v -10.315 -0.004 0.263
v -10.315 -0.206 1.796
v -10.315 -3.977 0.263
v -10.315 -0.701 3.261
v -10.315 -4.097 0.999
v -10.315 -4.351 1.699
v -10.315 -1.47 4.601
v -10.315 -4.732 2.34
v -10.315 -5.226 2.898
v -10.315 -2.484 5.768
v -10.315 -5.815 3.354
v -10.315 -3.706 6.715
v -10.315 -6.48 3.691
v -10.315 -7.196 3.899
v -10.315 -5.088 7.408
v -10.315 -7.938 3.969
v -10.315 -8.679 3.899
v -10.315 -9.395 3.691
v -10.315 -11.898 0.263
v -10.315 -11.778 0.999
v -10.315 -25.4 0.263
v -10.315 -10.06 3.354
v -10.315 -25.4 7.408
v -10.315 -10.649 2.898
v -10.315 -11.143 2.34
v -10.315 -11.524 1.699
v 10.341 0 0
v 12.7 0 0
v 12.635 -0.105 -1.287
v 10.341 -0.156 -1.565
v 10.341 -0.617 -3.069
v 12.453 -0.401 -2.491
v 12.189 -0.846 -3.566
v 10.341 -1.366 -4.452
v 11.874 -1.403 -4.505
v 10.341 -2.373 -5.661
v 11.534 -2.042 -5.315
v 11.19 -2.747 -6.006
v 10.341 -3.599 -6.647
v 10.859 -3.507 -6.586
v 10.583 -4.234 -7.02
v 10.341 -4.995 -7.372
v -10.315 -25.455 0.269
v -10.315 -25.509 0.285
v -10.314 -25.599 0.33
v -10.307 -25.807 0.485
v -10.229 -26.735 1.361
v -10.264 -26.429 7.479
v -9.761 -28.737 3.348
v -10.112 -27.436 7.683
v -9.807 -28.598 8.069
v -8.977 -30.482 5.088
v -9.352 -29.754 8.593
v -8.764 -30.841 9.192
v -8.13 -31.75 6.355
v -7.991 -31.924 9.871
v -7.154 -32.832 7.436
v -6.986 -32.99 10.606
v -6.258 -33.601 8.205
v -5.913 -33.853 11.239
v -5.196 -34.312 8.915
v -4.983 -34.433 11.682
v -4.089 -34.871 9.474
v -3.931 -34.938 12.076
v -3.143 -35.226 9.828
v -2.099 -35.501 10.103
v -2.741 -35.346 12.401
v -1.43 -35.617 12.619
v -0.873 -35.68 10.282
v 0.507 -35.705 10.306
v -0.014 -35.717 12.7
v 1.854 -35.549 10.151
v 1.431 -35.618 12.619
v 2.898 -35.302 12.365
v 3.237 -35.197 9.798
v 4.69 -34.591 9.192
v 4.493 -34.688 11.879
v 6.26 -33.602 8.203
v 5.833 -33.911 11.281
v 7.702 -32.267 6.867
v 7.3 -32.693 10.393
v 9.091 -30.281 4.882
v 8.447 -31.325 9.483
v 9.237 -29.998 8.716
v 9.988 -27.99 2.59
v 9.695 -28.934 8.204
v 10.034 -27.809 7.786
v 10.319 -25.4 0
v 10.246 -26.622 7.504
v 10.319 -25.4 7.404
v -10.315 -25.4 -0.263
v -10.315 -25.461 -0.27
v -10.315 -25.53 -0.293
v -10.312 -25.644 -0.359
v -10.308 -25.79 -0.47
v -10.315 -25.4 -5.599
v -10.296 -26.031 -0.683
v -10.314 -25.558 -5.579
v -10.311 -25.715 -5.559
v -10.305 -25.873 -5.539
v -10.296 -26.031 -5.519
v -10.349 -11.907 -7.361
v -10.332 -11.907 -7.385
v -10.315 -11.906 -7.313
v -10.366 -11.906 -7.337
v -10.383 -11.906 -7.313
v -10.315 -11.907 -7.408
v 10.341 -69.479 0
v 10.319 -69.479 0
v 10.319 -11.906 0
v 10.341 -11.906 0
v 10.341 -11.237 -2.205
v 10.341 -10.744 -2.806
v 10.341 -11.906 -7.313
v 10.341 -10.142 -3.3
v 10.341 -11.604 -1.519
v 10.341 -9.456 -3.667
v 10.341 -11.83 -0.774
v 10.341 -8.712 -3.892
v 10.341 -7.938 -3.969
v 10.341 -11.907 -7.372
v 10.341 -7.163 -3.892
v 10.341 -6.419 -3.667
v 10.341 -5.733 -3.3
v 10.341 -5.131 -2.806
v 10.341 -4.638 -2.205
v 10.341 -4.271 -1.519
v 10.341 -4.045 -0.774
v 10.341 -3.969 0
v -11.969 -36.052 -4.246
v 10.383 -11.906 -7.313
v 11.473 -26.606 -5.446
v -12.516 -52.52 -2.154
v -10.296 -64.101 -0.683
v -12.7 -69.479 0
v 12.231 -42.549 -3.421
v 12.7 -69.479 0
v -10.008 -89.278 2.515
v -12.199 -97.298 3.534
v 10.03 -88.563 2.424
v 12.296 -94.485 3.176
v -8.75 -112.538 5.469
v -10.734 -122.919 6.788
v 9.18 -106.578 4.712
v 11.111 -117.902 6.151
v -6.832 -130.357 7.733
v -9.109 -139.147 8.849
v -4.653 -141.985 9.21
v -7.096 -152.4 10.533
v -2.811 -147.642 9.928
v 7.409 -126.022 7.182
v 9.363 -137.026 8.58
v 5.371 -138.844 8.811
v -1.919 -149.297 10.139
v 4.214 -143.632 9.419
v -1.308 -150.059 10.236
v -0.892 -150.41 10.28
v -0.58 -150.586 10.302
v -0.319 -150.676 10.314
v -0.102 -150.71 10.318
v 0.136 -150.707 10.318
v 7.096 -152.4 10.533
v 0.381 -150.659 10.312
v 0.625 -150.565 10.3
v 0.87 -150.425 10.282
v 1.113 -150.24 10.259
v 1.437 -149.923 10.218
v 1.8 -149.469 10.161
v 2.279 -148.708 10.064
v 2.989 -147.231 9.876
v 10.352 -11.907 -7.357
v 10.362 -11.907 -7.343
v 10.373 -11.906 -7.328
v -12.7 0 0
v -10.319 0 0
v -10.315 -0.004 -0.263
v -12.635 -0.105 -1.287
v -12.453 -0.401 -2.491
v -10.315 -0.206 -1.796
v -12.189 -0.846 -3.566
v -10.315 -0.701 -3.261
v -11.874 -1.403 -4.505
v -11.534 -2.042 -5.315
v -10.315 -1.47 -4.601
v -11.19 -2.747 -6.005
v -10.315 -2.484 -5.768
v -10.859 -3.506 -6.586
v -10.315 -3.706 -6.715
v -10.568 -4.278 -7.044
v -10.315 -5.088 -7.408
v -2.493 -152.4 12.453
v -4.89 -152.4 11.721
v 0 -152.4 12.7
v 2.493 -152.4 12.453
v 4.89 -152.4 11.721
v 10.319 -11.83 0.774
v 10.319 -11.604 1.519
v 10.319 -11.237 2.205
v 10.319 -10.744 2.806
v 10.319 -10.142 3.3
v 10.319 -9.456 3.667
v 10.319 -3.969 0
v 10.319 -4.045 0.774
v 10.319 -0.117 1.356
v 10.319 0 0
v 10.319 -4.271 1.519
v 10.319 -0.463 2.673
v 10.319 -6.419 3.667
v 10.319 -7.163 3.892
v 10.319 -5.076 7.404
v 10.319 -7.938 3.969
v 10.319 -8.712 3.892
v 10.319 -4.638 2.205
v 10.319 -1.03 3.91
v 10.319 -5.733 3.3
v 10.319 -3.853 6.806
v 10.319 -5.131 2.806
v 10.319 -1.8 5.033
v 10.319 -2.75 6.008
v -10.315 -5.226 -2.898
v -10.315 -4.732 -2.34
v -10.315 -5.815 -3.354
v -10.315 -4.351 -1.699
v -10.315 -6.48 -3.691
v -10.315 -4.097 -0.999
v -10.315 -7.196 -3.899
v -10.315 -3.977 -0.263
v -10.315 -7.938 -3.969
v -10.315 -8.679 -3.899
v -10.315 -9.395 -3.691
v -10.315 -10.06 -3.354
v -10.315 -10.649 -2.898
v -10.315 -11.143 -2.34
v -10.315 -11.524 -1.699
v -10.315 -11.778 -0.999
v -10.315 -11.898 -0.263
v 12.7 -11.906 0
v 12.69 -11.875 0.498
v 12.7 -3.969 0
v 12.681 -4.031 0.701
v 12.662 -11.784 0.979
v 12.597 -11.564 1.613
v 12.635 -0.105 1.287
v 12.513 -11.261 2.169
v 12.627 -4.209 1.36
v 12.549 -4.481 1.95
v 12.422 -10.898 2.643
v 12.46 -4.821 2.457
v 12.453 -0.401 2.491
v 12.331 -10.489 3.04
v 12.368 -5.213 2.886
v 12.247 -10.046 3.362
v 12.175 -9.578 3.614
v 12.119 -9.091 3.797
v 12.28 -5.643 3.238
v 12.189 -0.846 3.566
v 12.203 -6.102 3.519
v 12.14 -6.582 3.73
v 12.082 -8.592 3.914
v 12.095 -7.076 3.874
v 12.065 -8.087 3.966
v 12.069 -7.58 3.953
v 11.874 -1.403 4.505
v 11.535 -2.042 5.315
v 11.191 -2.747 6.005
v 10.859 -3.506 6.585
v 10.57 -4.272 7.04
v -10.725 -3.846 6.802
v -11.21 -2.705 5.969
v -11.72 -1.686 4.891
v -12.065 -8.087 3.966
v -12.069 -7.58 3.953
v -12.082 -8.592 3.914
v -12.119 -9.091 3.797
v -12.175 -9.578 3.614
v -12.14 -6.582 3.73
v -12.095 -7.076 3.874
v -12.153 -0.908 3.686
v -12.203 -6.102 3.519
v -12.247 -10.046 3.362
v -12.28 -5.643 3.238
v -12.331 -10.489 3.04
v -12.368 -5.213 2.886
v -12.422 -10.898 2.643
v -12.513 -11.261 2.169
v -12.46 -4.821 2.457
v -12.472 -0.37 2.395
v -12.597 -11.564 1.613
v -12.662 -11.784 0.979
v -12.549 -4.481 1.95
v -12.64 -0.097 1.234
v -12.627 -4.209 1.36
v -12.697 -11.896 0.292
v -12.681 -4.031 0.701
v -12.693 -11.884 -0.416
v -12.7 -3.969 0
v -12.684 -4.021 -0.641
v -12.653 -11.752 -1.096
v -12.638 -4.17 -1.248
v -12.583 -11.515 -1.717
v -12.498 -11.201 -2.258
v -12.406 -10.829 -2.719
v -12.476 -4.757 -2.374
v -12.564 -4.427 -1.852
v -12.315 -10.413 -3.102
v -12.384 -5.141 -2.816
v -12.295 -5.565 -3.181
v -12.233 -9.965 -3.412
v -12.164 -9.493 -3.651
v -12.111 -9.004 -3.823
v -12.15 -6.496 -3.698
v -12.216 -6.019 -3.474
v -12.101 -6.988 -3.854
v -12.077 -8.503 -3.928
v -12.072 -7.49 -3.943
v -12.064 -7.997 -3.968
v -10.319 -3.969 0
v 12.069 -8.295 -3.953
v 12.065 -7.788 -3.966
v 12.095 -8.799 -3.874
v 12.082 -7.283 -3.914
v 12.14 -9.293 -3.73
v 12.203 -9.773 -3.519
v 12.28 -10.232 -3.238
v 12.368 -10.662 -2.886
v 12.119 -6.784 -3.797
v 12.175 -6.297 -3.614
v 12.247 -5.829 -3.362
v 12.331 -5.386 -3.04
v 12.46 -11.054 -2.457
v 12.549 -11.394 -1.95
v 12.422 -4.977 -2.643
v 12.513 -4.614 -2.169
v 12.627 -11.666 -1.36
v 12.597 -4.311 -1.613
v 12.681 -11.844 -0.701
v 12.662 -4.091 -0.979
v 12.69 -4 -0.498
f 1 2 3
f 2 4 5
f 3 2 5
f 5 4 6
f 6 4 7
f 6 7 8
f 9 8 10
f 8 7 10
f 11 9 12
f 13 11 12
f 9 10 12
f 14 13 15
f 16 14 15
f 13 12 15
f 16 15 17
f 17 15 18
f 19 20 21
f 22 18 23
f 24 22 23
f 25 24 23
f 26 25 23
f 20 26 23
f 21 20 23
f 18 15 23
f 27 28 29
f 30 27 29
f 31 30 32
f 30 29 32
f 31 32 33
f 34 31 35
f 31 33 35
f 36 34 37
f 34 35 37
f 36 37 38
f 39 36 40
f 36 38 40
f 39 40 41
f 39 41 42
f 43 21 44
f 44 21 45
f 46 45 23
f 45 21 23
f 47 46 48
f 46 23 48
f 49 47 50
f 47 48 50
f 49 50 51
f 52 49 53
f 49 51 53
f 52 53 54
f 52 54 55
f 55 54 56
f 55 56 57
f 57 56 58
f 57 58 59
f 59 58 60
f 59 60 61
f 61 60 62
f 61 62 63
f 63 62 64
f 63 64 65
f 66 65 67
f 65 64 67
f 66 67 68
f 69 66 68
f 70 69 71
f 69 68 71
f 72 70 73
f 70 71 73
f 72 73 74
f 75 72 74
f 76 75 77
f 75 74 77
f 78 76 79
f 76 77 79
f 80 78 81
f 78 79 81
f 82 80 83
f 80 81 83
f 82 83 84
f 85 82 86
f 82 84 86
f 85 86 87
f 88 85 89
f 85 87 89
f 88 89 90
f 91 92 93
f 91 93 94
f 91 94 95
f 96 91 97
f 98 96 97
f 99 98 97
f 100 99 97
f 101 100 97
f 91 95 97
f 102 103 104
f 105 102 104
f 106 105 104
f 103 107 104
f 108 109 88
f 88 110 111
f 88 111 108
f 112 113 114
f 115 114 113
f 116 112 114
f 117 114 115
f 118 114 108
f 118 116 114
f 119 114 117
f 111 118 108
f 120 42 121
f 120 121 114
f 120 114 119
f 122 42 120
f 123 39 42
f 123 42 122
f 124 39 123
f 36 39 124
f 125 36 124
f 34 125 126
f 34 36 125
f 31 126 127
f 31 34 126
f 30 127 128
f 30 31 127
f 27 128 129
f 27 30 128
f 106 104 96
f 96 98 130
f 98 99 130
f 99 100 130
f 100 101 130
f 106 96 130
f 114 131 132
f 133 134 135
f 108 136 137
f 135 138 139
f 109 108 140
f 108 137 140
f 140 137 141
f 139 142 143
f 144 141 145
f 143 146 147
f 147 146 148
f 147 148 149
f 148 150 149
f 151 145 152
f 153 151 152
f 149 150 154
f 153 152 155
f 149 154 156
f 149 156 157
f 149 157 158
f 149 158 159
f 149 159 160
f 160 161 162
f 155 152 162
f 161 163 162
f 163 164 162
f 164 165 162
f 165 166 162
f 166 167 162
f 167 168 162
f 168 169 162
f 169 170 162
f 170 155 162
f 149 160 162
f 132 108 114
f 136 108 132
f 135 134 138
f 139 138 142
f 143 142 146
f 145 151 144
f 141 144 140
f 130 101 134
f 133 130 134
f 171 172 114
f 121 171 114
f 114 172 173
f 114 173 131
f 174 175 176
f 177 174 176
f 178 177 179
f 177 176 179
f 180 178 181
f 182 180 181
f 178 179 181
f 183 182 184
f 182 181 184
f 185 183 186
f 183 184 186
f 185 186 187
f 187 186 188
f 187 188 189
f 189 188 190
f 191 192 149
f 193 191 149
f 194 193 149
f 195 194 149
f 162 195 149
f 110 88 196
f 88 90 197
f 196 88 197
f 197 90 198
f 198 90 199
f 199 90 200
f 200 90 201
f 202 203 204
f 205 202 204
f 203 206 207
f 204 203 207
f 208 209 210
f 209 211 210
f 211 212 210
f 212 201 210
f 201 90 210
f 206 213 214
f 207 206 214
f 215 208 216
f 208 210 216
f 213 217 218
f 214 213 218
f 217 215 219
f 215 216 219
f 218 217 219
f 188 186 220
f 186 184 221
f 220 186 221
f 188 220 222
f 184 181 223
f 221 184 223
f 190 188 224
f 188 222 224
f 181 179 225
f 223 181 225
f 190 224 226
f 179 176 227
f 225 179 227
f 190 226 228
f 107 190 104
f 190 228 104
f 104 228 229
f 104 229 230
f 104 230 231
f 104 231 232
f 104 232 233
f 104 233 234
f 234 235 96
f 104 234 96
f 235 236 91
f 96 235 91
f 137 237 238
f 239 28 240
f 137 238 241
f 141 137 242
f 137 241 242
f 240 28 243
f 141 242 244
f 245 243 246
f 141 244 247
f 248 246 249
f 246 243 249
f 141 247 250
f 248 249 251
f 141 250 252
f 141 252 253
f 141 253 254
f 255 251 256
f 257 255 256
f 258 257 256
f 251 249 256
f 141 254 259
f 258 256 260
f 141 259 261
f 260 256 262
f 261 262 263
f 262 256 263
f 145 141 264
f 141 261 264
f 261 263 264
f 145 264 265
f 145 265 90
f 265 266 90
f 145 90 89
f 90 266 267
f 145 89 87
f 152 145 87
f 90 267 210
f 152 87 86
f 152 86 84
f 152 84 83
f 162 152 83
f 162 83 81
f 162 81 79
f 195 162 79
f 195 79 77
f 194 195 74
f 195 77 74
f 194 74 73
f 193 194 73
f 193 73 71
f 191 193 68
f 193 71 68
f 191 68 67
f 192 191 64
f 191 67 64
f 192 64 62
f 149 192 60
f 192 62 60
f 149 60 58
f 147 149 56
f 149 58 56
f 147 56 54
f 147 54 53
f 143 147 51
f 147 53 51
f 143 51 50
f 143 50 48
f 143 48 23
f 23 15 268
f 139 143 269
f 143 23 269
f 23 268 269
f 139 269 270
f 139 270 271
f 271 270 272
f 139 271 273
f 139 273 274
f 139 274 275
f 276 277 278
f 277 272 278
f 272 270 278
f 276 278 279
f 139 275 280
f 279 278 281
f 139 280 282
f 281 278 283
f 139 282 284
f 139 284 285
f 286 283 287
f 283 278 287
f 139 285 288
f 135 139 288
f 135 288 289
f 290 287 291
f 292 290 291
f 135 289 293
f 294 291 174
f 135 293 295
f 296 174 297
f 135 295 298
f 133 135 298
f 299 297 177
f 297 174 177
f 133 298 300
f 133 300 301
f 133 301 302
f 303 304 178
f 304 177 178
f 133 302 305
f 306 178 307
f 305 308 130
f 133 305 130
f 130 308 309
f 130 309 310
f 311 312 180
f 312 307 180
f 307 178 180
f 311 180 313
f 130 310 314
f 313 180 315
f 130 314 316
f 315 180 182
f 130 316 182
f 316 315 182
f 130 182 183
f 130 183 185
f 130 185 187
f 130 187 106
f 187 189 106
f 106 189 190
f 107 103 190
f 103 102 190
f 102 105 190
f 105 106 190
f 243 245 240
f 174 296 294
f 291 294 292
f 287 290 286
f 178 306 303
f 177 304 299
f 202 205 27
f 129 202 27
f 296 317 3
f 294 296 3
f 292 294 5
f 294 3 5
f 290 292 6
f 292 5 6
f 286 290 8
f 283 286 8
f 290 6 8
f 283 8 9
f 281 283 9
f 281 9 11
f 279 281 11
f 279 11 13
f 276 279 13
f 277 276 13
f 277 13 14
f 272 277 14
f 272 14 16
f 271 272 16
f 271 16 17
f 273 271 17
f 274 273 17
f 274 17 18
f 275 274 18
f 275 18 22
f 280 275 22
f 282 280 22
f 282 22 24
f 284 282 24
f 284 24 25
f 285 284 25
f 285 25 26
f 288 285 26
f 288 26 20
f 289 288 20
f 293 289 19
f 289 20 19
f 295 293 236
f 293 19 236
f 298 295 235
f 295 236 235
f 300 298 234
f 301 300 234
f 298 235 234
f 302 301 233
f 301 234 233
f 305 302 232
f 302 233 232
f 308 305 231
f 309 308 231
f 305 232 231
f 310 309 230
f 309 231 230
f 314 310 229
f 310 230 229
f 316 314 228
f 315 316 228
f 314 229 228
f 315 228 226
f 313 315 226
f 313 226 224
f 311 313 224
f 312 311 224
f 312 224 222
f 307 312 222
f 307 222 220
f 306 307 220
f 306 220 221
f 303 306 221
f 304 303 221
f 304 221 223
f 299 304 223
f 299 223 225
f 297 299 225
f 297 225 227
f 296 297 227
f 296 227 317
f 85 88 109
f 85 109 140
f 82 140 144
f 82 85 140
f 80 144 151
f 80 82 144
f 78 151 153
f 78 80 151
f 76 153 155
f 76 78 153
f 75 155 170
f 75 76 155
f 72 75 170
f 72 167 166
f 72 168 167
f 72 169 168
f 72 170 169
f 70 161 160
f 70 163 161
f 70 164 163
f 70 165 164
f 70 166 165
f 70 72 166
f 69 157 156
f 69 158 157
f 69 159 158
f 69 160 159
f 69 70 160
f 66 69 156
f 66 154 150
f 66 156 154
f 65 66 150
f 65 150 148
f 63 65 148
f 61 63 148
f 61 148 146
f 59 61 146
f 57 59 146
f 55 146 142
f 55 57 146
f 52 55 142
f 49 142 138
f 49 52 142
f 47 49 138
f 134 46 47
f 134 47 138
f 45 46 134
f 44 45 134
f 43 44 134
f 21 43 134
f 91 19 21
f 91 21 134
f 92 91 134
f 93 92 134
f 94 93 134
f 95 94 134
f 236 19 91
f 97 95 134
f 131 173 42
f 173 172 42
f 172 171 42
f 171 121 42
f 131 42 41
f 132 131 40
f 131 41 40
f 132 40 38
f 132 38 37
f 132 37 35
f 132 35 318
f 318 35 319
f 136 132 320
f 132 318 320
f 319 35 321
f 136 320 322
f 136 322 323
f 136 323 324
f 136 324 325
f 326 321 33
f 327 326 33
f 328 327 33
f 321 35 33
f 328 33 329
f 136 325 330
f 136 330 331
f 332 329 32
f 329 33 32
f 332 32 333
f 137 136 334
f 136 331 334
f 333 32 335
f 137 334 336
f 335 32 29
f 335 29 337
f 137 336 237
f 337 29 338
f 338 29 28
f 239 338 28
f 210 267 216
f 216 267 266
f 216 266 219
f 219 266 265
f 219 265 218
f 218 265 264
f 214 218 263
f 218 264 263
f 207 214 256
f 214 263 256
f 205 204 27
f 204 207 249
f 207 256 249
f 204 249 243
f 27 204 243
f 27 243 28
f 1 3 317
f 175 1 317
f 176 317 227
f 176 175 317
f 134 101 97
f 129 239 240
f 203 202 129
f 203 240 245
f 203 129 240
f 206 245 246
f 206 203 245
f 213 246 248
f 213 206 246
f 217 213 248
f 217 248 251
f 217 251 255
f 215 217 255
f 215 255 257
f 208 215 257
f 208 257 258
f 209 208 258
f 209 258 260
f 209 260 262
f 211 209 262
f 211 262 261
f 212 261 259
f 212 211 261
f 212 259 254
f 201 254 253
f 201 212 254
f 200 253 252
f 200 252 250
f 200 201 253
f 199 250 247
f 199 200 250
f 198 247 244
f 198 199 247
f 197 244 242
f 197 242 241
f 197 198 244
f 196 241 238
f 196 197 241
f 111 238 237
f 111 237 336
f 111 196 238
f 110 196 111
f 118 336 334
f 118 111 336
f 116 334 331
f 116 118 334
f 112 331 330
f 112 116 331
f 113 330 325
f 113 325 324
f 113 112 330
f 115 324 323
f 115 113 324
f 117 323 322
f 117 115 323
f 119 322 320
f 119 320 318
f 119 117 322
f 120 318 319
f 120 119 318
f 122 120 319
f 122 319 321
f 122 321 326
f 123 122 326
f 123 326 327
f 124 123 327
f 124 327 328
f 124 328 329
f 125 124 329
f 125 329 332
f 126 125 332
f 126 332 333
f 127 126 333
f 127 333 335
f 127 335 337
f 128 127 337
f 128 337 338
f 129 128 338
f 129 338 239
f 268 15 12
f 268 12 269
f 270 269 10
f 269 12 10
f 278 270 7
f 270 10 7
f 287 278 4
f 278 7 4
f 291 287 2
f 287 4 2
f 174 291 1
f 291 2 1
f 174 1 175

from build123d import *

# Parameters (mm, degrees)
F0_R          = 12.7
F0_R_2        = 10.31875
F1_DEPTH      = 152.4
F2_R          = 3.96875
F3_DEPTH      = 25.4
F3_DEPTH_BACK = 25.4
F5_DEPTH      = 12.7
F7_DEPTH      = 12.7
F8_W          = 20.6375
F8_H          = 12.7
F9_DEPTH      = 127
F11_DEPTH     = 12.7


with BuildPart() as f1:
    # F0 (on Front) → F1 (new body)
    with BuildSketch(Plane.XZ):
        Circle(F0_R)
        Circle(F0_R_2, mode=Mode.SUBTRACT)
    extrude(amount=F1_DEPTH)

    # F2 (on Right) → F3 (cut, two sides)
    with BuildSketch(Plane.YZ) as f3_sk:
        with Locations((-7.9375, 0)):
            Circle(F2_R)
    extrude(amount=F3_DEPTH, mode=Mode.SUBTRACT)
    extrude(f3_sk.sketch, amount=-F3_DEPTH_BACK, mode=Mode.SUBTRACT)

    # F4 (on Top) → F5 (cut, symmetric)
    with BuildSketch(Plane.XY):
        with BuildLine():
            Line((-10.315392, 0), (-10.315392, -25.4))
            ThreePointArc((-10.315392, -25.4), (0.001679, -35.717071), (10.31875, -25.4))
            Line((10.31875, -25.4), (10.31875, 0))
            Line((10.31875, 0), (-10.315392, 0))
        make_face()
    extrude(amount=F5_DEPTH, both=True, mode=Mode.SUBTRACT)

    # F6 (on Right) → F7 (cut, symmetric)
    with BuildSketch(Plane.YZ):
        Polygon((-11.90625, -7.313158), (-152.4, 10.53286), (-152.4, -12.869733), (-11.961568, -12.869733), align=None)
    extrude(amount=F7_DEPTH, both=True, mode=Mode.SUBTRACT)

    # F8 (on Front) → F9 (cut)
    with BuildSketch(Plane.XZ):
        with Locations((0.022642, -6.35)):
            Rectangle(F8_W, F8_H)
    extrude(amount=F9_DEPTH, mode=Mode.SUBTRACT)

    # F10 (on Right) → F11 (cut, symmetric)
    with BuildSketch(Plane.YZ):
        with BuildLine():
            ThreePointArc((-7.9375, 7.9375), (-2.32484, 5.61266), (0, 0))
            Line((0, 0), (0, 7.9375))
            Line((0, 7.9375), (-7.9375, 7.9375))
        make_face()
        with BuildLine():
            ThreePointArc((0, 0), (-2.32484, -5.61266), (-7.9375, -7.9375))
            Line((-7.9375, -7.9375), (0, -7.9375))
            Line((0, -7.9375), (0, 0))
        make_face()
    extrude(amount=F11_DEPTH, both=True, mode=Mode.SUBTRACT)


solid = f1.part
